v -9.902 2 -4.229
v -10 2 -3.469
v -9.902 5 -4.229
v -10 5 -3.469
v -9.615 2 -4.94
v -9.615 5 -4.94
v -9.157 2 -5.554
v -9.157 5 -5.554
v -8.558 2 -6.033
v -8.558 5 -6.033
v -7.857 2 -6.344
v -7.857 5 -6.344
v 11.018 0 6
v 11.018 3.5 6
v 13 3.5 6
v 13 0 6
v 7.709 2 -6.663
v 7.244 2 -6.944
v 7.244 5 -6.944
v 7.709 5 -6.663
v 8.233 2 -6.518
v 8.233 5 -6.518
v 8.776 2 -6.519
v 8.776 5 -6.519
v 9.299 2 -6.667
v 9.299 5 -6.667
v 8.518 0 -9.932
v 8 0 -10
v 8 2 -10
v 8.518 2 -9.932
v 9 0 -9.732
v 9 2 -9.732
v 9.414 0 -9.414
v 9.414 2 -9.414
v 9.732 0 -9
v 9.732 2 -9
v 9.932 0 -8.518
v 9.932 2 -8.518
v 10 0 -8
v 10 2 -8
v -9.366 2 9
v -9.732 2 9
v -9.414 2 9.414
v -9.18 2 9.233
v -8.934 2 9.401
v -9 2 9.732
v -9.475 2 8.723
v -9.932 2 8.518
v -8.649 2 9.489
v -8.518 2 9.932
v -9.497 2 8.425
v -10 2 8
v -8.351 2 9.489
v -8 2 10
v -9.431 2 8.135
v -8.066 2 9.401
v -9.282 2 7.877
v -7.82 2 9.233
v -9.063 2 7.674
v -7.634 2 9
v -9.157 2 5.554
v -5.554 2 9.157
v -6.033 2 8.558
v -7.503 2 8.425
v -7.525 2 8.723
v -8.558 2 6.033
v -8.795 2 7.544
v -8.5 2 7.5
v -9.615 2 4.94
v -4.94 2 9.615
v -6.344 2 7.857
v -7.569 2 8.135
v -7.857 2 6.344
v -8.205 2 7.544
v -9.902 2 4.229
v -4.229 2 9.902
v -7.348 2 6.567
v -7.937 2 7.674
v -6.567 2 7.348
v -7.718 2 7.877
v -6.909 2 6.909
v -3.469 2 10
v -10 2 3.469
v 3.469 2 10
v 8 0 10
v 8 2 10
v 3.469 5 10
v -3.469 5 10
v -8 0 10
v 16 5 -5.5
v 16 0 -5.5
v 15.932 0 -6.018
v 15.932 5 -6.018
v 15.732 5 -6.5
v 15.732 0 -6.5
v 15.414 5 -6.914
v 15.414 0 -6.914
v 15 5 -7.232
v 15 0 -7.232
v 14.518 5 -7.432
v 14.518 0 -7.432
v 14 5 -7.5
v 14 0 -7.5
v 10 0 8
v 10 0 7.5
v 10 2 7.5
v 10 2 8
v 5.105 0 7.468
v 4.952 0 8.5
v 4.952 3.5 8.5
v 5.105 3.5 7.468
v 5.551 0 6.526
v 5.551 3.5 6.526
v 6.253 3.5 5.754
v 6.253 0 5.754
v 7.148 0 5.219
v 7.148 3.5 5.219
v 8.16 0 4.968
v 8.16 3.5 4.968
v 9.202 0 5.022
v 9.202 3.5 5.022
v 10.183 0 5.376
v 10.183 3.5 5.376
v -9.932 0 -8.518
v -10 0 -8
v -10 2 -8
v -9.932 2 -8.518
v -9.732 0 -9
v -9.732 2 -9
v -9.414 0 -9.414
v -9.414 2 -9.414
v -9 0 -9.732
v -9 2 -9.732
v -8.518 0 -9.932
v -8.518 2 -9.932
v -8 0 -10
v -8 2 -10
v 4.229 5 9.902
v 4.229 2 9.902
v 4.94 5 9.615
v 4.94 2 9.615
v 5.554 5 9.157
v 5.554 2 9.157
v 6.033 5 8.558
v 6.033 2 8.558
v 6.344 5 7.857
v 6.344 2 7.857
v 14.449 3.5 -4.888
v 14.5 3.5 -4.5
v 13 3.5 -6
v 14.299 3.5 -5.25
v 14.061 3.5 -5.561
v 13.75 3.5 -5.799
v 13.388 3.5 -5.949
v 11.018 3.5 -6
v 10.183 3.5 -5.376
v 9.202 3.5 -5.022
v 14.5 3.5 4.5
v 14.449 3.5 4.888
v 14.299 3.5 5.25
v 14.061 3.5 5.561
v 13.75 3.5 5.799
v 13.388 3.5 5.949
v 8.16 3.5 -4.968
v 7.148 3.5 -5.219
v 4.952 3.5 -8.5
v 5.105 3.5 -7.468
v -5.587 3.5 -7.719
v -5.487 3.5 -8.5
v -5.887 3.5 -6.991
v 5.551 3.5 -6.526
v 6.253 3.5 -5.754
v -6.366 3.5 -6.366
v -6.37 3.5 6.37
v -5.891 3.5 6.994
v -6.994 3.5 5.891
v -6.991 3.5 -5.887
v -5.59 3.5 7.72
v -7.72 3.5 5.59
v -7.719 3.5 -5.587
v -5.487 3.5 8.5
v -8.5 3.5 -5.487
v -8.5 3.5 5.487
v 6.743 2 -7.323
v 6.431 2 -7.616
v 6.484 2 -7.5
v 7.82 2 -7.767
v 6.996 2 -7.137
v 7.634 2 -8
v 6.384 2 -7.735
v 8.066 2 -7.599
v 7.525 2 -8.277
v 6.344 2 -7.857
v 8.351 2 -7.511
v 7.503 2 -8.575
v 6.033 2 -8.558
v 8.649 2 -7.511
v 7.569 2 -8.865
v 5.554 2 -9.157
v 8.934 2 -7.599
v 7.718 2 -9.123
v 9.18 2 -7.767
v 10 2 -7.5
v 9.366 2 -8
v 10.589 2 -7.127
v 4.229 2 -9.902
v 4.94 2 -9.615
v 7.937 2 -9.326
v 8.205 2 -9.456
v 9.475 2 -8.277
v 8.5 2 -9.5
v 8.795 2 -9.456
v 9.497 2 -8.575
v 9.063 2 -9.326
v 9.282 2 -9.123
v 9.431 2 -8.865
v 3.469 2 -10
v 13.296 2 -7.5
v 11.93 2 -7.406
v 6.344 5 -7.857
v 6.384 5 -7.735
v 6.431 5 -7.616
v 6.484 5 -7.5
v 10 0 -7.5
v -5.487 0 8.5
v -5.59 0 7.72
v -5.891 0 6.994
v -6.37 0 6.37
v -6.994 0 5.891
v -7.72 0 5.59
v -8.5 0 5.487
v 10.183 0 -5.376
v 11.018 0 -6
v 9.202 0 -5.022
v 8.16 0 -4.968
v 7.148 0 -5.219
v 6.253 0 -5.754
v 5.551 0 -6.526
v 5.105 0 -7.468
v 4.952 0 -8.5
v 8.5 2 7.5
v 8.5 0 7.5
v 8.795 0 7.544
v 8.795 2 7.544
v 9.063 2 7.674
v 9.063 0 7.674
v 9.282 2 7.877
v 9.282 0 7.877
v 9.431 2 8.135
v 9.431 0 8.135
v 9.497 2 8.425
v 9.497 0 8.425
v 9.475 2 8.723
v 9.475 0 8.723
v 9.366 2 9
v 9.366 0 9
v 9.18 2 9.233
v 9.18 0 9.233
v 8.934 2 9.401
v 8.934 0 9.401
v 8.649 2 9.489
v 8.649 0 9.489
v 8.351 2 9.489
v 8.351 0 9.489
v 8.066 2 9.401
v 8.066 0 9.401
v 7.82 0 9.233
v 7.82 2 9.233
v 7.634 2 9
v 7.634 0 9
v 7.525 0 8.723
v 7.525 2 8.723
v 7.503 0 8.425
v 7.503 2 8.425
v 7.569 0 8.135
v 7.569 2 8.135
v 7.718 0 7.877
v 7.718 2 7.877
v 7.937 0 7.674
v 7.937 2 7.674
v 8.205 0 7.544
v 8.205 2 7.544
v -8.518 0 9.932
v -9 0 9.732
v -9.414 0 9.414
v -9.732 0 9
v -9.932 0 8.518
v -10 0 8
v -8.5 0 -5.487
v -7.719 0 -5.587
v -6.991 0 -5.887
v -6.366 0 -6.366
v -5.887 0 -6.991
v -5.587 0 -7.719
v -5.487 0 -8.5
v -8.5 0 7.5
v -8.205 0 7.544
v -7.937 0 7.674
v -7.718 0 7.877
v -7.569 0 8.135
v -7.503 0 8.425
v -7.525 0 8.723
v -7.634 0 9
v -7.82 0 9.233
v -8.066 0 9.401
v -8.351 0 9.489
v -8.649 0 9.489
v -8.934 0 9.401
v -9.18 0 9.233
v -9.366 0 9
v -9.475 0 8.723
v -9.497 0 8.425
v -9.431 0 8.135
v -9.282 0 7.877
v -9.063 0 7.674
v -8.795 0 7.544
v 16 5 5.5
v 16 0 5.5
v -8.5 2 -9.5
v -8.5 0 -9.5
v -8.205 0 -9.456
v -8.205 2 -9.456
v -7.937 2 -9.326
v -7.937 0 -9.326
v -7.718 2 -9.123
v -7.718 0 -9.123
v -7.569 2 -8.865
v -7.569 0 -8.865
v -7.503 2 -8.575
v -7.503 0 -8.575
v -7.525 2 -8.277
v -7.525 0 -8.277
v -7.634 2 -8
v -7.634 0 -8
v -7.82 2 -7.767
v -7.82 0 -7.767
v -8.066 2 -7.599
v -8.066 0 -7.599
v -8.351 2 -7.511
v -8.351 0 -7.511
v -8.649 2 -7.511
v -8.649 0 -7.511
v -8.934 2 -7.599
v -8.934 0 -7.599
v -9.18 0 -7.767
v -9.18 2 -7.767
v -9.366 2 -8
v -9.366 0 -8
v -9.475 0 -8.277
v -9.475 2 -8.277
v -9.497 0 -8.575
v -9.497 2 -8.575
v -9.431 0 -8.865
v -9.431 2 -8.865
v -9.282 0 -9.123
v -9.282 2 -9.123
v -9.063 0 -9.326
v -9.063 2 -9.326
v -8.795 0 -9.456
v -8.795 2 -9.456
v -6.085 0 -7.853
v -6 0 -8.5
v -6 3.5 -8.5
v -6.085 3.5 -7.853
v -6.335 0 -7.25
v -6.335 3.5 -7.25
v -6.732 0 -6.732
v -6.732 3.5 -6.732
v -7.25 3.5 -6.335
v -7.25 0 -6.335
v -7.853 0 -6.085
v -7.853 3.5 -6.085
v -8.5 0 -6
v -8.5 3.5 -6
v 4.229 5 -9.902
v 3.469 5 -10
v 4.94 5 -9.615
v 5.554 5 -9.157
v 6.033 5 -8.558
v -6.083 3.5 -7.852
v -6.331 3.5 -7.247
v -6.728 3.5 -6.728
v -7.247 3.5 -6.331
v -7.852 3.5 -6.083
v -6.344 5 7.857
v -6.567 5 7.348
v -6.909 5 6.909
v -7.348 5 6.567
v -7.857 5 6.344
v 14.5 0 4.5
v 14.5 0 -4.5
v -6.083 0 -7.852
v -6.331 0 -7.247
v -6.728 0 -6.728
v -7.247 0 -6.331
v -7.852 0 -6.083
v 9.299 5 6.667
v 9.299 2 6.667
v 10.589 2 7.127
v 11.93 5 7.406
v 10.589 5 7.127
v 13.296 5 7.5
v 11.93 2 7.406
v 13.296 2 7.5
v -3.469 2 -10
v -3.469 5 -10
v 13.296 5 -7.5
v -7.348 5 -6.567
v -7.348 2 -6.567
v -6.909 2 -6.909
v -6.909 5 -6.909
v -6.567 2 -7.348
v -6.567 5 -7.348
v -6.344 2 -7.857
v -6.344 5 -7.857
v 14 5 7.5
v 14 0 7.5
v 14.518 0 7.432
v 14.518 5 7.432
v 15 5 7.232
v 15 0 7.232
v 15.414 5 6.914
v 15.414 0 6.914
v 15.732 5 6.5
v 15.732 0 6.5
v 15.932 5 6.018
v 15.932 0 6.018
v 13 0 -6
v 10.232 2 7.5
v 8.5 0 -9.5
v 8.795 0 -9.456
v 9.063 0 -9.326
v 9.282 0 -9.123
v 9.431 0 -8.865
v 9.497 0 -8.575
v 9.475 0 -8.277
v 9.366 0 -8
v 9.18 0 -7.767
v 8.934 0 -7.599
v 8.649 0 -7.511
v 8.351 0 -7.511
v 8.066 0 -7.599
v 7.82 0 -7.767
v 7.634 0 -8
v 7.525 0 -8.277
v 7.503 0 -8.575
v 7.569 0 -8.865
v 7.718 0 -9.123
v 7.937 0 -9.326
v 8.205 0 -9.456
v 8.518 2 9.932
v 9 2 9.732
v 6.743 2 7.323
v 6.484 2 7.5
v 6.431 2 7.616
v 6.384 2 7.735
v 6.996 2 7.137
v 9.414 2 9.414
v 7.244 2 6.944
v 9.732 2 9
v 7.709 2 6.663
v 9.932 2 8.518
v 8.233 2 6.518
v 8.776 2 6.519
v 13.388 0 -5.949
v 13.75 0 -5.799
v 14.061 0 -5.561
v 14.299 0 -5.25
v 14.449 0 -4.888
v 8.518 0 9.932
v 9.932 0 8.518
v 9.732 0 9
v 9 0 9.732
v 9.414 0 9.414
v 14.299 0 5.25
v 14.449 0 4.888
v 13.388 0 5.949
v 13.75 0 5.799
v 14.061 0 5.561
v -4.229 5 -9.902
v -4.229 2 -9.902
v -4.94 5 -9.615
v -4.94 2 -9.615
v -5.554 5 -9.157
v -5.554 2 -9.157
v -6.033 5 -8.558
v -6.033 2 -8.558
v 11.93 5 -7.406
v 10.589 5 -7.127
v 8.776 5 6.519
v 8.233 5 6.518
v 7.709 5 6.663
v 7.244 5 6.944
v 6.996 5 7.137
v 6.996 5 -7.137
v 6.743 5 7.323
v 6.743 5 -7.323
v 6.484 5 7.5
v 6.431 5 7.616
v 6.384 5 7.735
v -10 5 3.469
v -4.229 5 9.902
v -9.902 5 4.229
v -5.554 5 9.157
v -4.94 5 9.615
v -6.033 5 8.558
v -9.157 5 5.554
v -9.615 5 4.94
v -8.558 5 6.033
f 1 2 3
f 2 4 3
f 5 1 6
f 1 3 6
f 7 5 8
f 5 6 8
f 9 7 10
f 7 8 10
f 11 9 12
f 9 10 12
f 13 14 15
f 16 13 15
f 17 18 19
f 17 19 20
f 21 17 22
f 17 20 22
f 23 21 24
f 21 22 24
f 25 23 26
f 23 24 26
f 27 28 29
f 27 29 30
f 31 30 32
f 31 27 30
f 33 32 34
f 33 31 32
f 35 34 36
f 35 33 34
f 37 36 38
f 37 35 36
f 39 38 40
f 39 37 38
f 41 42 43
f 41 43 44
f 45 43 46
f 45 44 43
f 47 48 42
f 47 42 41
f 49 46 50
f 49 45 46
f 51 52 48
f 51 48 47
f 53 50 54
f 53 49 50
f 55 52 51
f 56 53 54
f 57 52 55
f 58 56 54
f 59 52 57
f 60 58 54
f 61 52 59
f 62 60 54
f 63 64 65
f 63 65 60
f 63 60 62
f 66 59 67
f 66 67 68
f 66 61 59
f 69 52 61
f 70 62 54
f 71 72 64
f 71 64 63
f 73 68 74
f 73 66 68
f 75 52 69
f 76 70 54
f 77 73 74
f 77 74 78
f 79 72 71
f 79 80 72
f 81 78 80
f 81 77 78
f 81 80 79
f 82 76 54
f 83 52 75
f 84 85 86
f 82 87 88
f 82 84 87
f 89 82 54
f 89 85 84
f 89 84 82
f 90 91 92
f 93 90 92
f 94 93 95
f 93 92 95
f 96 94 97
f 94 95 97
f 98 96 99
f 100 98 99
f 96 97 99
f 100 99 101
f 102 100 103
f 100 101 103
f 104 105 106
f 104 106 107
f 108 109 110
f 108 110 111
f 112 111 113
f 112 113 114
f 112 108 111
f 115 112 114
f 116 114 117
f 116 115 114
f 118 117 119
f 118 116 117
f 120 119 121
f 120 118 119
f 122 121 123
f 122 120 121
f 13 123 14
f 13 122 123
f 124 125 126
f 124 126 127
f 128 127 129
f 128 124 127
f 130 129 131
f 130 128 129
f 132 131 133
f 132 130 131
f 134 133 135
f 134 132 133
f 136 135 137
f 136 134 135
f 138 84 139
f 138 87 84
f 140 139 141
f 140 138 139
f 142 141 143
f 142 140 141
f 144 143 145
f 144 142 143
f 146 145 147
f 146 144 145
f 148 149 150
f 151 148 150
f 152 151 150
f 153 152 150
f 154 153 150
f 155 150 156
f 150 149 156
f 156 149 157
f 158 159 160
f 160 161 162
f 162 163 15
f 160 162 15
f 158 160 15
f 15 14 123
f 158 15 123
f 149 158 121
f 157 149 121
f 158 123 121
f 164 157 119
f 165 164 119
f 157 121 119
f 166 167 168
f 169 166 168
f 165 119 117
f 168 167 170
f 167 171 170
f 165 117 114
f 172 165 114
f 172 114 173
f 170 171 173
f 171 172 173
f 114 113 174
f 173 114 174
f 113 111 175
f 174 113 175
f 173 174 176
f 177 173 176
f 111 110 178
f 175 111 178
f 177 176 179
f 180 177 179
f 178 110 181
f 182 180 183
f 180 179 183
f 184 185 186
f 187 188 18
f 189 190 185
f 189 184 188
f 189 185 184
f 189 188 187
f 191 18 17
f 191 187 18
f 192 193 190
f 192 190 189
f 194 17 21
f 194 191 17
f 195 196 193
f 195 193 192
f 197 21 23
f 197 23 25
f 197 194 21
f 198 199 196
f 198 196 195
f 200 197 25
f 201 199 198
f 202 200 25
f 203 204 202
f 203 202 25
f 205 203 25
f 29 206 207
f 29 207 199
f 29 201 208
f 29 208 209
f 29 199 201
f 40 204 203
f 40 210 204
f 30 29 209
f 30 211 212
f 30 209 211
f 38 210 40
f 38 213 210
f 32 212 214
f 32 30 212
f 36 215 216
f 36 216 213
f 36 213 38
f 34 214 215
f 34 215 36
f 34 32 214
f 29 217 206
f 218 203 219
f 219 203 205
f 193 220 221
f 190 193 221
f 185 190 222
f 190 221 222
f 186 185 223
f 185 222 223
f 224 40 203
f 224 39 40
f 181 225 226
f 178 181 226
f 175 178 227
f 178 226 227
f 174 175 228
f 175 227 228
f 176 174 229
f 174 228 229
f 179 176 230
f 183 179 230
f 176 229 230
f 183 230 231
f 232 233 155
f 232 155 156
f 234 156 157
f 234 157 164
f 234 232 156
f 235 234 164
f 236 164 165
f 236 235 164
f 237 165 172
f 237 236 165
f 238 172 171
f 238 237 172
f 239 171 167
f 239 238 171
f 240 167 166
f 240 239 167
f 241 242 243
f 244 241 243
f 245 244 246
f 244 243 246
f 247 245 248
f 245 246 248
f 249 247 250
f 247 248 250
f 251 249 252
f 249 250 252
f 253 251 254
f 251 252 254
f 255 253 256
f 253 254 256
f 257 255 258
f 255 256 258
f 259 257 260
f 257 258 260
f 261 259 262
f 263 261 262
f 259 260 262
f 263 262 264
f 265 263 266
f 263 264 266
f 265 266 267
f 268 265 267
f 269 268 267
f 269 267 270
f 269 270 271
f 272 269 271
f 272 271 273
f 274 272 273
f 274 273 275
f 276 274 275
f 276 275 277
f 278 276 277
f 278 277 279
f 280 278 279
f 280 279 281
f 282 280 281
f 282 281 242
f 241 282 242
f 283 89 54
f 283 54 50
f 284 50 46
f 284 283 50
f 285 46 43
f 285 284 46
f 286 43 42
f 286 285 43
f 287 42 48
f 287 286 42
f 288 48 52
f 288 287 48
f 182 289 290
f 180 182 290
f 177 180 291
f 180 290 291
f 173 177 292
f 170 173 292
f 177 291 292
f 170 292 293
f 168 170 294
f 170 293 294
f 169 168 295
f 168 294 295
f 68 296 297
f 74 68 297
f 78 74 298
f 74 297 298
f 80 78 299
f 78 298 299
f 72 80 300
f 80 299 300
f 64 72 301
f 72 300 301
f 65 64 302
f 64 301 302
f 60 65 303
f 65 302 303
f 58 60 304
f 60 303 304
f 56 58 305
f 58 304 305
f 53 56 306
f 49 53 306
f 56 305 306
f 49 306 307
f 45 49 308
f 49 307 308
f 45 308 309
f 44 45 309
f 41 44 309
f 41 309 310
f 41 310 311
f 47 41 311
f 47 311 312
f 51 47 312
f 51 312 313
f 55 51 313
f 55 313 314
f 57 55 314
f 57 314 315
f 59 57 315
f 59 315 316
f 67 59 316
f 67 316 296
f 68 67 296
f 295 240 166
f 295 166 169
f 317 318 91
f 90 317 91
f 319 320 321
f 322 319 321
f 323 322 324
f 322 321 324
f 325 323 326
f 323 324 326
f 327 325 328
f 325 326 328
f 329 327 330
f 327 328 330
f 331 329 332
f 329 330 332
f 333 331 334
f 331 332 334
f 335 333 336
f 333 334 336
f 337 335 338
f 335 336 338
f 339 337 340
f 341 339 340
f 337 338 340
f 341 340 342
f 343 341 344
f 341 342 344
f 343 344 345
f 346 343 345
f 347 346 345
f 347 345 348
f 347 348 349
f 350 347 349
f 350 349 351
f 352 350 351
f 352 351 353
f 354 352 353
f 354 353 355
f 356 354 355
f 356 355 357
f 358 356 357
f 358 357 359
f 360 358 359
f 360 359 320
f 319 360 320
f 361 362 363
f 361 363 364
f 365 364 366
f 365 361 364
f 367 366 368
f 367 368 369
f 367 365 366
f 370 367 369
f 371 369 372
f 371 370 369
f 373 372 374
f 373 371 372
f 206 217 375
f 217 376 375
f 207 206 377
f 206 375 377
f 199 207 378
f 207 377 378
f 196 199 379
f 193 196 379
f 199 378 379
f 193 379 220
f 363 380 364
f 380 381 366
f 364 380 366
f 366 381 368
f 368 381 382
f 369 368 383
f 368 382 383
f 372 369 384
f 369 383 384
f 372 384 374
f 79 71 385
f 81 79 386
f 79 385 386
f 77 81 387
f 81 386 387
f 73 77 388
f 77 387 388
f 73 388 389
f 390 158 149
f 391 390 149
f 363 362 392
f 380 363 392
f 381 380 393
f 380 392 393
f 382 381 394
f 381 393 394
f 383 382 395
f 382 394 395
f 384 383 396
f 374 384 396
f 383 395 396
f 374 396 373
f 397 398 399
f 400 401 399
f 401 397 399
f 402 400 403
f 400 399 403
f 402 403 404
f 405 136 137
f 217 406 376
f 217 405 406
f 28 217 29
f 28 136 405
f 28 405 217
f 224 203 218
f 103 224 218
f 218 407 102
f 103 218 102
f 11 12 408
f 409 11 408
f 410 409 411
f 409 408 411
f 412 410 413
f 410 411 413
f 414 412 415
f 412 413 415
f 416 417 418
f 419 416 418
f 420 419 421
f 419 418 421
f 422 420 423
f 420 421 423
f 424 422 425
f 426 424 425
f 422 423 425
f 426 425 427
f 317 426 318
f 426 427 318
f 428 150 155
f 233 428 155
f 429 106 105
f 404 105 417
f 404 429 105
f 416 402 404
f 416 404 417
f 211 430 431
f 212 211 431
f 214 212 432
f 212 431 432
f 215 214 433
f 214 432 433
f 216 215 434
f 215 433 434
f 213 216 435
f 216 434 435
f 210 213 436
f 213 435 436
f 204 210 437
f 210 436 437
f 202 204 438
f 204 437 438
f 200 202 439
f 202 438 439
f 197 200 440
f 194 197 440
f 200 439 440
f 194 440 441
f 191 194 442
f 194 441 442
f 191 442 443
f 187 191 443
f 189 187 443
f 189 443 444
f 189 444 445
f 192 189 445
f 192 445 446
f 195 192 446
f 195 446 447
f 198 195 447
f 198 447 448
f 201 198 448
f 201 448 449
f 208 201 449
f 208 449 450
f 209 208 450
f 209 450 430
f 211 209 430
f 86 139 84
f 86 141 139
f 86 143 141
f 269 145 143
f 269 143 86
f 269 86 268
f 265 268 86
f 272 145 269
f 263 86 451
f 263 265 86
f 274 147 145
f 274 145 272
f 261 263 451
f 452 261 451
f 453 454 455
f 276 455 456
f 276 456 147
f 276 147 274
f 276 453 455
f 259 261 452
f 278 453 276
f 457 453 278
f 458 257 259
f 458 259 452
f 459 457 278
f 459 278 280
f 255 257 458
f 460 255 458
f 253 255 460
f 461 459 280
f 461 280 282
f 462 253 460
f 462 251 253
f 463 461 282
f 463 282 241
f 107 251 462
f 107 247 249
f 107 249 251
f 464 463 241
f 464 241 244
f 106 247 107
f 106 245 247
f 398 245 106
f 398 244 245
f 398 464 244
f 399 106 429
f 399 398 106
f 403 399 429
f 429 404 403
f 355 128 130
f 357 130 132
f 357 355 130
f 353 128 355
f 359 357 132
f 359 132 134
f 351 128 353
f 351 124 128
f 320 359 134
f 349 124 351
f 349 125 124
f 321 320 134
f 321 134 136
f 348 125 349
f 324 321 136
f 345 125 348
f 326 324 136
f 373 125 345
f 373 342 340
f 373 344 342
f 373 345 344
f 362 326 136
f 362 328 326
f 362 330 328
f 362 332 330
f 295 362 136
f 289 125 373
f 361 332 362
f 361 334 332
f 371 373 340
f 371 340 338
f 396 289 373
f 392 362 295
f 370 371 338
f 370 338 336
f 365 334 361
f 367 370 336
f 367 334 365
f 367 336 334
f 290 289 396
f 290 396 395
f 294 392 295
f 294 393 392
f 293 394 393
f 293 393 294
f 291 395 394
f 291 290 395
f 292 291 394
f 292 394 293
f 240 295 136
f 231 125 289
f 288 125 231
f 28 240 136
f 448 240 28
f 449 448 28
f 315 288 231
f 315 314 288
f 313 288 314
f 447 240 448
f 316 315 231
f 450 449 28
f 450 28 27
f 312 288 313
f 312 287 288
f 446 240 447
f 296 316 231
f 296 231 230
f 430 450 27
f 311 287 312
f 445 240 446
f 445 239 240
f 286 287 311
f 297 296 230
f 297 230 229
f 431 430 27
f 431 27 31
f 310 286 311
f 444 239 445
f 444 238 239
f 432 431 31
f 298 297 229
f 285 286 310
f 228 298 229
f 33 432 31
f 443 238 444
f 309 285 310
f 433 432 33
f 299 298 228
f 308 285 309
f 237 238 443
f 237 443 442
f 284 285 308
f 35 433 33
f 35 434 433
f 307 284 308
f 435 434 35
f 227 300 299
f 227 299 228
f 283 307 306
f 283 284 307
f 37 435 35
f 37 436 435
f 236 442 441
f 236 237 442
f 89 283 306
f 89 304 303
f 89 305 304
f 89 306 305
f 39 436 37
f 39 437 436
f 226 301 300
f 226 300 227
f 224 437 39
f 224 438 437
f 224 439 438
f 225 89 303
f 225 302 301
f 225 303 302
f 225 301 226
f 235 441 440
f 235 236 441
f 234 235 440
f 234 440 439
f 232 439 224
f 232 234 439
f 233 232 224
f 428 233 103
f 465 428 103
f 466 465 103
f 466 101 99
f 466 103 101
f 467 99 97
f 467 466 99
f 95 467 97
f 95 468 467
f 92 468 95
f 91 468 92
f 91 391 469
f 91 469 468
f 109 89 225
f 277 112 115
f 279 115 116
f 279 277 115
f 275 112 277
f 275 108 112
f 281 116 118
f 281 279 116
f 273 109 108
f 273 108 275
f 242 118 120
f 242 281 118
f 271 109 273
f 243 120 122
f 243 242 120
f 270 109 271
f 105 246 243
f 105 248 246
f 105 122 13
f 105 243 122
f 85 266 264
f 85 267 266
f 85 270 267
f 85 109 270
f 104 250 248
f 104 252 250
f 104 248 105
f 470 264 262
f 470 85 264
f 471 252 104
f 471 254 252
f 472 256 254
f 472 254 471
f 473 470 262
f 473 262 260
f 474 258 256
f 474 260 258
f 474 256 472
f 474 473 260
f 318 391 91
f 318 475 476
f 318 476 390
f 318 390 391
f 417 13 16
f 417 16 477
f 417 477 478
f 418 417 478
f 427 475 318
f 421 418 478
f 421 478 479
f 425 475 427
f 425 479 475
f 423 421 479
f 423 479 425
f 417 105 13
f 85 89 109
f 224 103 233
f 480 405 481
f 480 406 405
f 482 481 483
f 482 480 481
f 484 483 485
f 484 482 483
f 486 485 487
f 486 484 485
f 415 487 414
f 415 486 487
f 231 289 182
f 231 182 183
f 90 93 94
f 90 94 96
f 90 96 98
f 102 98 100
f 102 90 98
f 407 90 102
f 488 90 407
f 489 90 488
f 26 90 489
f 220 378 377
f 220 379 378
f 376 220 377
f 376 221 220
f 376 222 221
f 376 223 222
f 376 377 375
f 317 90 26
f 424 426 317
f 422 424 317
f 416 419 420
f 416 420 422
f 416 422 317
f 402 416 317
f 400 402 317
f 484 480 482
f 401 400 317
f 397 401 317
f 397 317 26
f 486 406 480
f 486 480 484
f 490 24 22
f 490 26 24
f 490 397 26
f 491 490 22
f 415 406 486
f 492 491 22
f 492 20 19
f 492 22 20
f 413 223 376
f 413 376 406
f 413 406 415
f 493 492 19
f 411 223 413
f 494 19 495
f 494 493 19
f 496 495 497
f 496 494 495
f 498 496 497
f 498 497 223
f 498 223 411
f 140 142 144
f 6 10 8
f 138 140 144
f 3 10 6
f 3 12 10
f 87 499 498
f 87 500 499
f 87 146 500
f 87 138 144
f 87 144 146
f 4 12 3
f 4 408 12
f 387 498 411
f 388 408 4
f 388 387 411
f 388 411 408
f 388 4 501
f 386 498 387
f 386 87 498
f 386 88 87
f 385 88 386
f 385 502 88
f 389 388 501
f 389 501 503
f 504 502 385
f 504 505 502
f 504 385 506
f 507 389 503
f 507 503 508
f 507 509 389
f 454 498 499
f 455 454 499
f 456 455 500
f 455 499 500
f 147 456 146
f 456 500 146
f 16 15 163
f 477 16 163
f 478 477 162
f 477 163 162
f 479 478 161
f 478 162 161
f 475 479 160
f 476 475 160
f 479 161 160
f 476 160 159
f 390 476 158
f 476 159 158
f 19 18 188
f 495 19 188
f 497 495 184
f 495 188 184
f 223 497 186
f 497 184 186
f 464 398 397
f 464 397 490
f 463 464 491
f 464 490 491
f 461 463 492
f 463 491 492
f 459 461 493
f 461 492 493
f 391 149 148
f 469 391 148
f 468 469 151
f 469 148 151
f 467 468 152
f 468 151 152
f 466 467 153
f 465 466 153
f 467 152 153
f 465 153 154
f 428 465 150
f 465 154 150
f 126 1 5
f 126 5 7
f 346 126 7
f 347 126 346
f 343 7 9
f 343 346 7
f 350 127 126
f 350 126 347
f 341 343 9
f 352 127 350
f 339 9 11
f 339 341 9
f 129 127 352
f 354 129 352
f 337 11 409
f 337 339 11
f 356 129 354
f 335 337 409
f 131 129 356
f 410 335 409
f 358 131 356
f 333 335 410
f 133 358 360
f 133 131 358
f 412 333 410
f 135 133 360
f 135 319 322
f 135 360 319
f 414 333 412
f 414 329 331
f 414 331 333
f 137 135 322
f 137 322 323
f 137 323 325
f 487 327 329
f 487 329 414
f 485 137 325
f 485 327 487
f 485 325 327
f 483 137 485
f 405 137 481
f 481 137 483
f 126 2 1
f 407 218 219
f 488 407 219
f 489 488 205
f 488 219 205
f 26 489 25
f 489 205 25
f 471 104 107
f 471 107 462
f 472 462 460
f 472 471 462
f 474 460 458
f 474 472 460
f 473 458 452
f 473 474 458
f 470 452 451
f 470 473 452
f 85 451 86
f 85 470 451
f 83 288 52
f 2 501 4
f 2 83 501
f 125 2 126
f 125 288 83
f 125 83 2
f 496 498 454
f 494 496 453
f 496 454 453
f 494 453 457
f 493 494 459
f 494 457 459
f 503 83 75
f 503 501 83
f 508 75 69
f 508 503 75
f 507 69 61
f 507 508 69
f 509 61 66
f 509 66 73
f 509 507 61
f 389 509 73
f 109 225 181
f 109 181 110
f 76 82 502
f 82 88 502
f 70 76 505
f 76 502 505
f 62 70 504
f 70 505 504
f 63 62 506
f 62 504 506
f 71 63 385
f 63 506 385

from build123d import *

# Parameters (mm, degrees)
BOSS_EXTRUDE1_DEPTH     = 5
SKETCH2_R               = 1
CUT_EXTRUDE1_DEPTH      = 15
SHELL1_DEPTH            = 3.5
SKETCH4_R               = 2.25
CUT_EXTRUDE2_DEPTH      = 3
FILLET2_R               = 3
BOSS_EXTRUDE2_DEPTH     = 5
CUT_EXTRUDE3_DEPTH      = 3.5
SKETCH8_W               = 3.515564437
SKETCH8_H               = 15
BOSS_EXTRUDE3_DEPTH     = 3
SKETCH9_R               = 2
CUT_EXTRUDE5_DEPTH      = 3
FILLET3_R               = 10
CUT_EXTRUDE7_DEPTH      = 3
CUT_EXTRUDE7_DEPTH_BACK = 1.5
BOSS_EXTRUDE4_START     = 3.5
BOSS_EXTRUDE4_DEPTH     = 3.5


with BuildPart() as part:
    # Sketch1 → Boss-Extrude1 (new body)
    with BuildSketch(Plane(origin=(0, 0, 0), x_dir=(1, 0, 0), z_dir=(0, 1, 0))):
        with BuildLine():
            Line((-8, 10), (8, 10))
            ThreePointArc((8, 10), (9.414213562, 9.414213562), (10, 8))
            Line((10, 8), (10, -8))
            ThreePointArc((10, -8), (9.414213562, -9.414213562), (8, -10))
            Line((8, -10), (-8, -10))
            ThreePointArc((-8, -10), (-9.414213562, -9.414213562), (-10, -8))
            Line((-10, -8), (-10, 8))
            ThreePointArc((-10, 8), (-9.414213562, 9.414213562), (-8, 10))
        make_face()
    extrude(amount=BOSS_EXTRUDE1_DEPTH)

    # Sketch2 → Cut-Extrude1 (cut)
    with BuildSketch(Plane.XZ):
        with Locations(Location((-8.5, 8.5, 0), (0, 0, 270))):
            Circle(SKETCH2_R)
        with Locations(Location((8.5, 8.5, 0), (0, 0, 270))):
            Circle(SKETCH2_R)
        with Locations(Location((8.5, -8.5, 0), (0, 0, 270))):
            Circle(SKETCH2_R)
        with Locations(Location((-8.5, -8.5, 0), (0, 0, 270))):
            Circle(SKETCH2_R)
    extrude(amount=-CUT_EXTRUDE1_DEPTH, mode=Mode.SUBTRACT)

    # Shell1: read off the stored shape, not the designer's step
    # Shell1 outline → Shell1 (cut)
    with BuildSketch(Plane(origin=(0, 0, 0), x_dir=(1, 0, 0), z_dir=(0, 1, 0))):
        with BuildLine():
            Line((6, 8.5), (-6, 8.5))
            ThreePointArc((-6, 8.5), (-6.732233047, 6.732233047), (-8.5, 6))
            Line((-8.5, 6), (-8.5, -6))
            ThreePointArc((-8.5, -6), (-6.732233047, -6.732233047), (-6, -8.5))
            Line((-6, -8.5), (6, -8.5))
            ThreePointArc((6, -8.5), (6.732233047, -6.732233047), (8.5, -6))
            Line((8.5, -6), (8.5, 6))
            ThreePointArc((8.5, 6), (6.732233047, 6.732233047), (6, 8.5))
        make_face()
    extrude(amount=SHELL1_DEPTH, mode=Mode.SUBTRACT)

    # Sketch4 → Cut-Extrude2 (cut)
    with BuildSketch(Plane(origin=(0, 5, 0), x_dir=(1, 0, 0), z_dir=(0, 1, 0))):
        with Locations((8.5, -8.5)):
            Circle(SKETCH4_R)
        with Locations((-8.5, -8.5)):
            Circle(SKETCH4_R)
        with Locations((-8.5, 8.5)):
            Circle(SKETCH4_R)
        with Locations((8.5, 8.5)):
            Circle(SKETCH4_R)
    extrude(amount=-CUT_EXTRUDE2_DEPTH, mode=Mode.SUBTRACT)

    # Fillet2
    fillet2_edges = [part.edges().sort_by_distance(p)[0] for p in [
        (6.822949017, 3.5, -10),
        (10, 3.5, -6.822949017),
        (-6.822949017, 3.5, -10),
        (-10, 3.5, -6.822949017),
        (-10, 3.5, 6.822949017),
        (-6.822949017, 3.5, 10),
        (6.822949017, 3.5, 10),
        (10, 3.5, 6.822949017),
    ]]
    fillet(fillet2_edges, radius=FILLET2_R)

    # Sketch5 → Boss-Extrude2 (add)
    with BuildSketch(Plane.XZ):
        with BuildLine():
            Line((10, 7.5), (14, 7.5))
            ThreePointArc((14, 7.5), (15.414213562, 6.914213562), (16, 5.5))
            Line((16, 5.5), (16, -5.5))
            ThreePointArc((16, -5.5), (15.414213562, -6.914213562), (14, -7.5))
            Line((14, -7.5), (10, -7.5))
            Line((10, -7.5), (10, 7.5))
        make_face()
    extrude(amount=-BOSS_EXTRUDE2_DEPTH)

    # Sketch6 → Cut-Extrude3 (cut)
    with BuildSketch(Plane.XZ):
        with BuildLine():
            Line((8.5, 5.5), (13, 5.5))
            ThreePointArc((13, 5.5), (14.060660172, 5.060660172), (14.5, 4))
            Line((14.5, 4), (14.5, -4))
            ThreePointArc((14.5, -4), (14.060660172, -5.060660172), (13, -5.5))
            Line((13, -5.5), (8.5, -5.5))
            Line((8.5, -5.5), (8.5, 5.5))
        make_face()
    extrude(amount=-CUT_EXTRUDE3_DEPTH, mode=Mode.SUBTRACT)

    # Sketch8 → Boss-Extrude3 (add)
    with BuildSketch(Plane(origin=(0, 5, 0), x_dir=(1, 0, 0), z_dir=(0, 1, 0))):
        with Locations((8.242217782, 0)):
            Rectangle(SKETCH8_W, SKETCH8_H)
    extrude(amount=-BOSS_EXTRUDE3_DEPTH)

    # Sketch9 → Cut-Extrude5 (cut)
    with BuildSketch(Plane(origin=(0, 5, 0), x_dir=(1, 0, 0), z_dir=(0, 1, 0))):
        with Locations((8.5, 8.5)):
            Circle(SKETCH9_R)
        with Locations((8.5, -8.5)):
            Circle(SKETCH9_R)
    extrude(amount=-CUT_EXTRUDE5_DEPTH, mode=Mode.SUBTRACT)

    # Fillet3
    # the kernel refuses this fillet: 10 mm, written as the material it takes off along each edge
    with BuildSketch(Plane(origin=(10.232050808, 2, -7.5), x_dir=(1, 0, 0), z_dir=(0, 1, 0))) as fillet3_piece_1:
        with BuildLine():
            CenterArc((3.063780716, -10), FILLET3_R, 90, 23.556464309)
            ThreePointArc((-0.932745554, -0.833333333), (-0.399552407, -0.491458351), (0, 0))
            Line((0, 0), (3.063780716, 0))
        make_face()
    extrude(amount=10.659451789, mode=Mode.SUBTRACT)
    with BuildSketch(Plane(origin=(6.767949192, 2, -7.5), x_dir=(0.649978972407837, 0, 0.759952192856664), z_dir=(0, 1, 0))) as fillet3_piece_2:
        with BuildLine():
            CenterArc((2.560910878, -9.831273909), FILLET3_R, 100.540016502, 5.393327967)
            Line((-0.184277898, -0.215456804), (0, 0))
            ThreePointArc((0, 0), (0.365844411, -0.033745218), (0.731688822, 0))
        make_face()
    extrude(amount=4.829222056, mode=Mode.SUBTRACT)
    with BuildSketch(Plane(origin=(10.232050808, 2, 7.5), x_dir=(-0.7457291752746819, 0, -0.6662492004829293), z_dir=(0, 1, 0))) as fillet3_piece_3:
        with BuildLine():
            CenterArc((4.377741338, -9.498533205), FILLET3_R, 108.221767845, 23.556464309)
            Line((-2.284750666, -2.041241452), (0, 0))
            ThreePointArc((0, 0), (0.62539162, -0.100293359), (1.25078324, 0))
        make_face()
    extrude(amount=10.659451789, mode=Mode.SUBTRACT)
    with BuildSketch(Plane(origin=(6.767949192, 2, 7.5), x_dir=(-1.0, 0, -2.3874717233974133e-11), z_dir=(0, 1, 0))) as fillet3_piece_4:
        with BuildLine():
            CenterArc((5.806759945, -8.33629115), FILLET3_R, 123.52663903, 5.393327967)
            ThreePointArc((-0.475582349, -0.556048525), (-0.212146422, -0.299957945), (0, 0))
            Line((0, 0), (0.28351363, 0))
        make_face()
    extrude(amount=4.829222056, mode=Mode.SUBTRACT)

    # Sketch10 → Cut-Extrude7 (cut, two sides: drawn at the far end of the back side and taken through both)
    with BuildSketch(Plane.XZ.offset(-2).offset(-CUT_EXTRUDE7_DEPTH_BACK)):
        with BuildLine():
            Line((8.5, 6), (13, 6))
            ThreePointArc((13, 6), (14.060660172, 5.560660172), (14.5, 4.5))
            Line((14.5, 4.5), (14.5, -4.5))
            ThreePointArc((14.5, -4.5), (14.060660172, -5.560660172), (13, -6))
            Line((13, -6), (8.5, -6))
            ThreePointArc((8.5, -6), (7.370298682, -6.269803835), (6.484435563, -7.020980054))
            Line((6.484435563, -7.020980054), (6.484435563, 7.020980054))
            ThreePointArc((6.484435563, 7.020980054), (7.392428114, 6.313490581), (8.5, 6))
        make_face()
    extrude(amount=CUT_EXTRUDE7_DEPTH + CUT_EXTRUDE7_DEPTH_BACK, mode=Mode.SUBTRACT)

    # Sketch11 → Boss-Extrude4 (add)
    with BuildSketch(Plane.XZ.offset(-3.5).offset(BOSS_EXTRUDE4_START)):
        with BuildLine():
            Line((4.951661673, -8.5), (6, -8.5))
            ThreePointArc((6, -8.5), (6.732233047, -6.732233047), (8.5, -6))
            Line((8.5, -6), (11.018075631, -6))
            ThreePointArc((11.018075631, -6), (7.148016159, -5.219322543), (4.951661673, -8.5))
        make_face()
        with BuildLine():
            Line((11.018075631, 6), (8.5, 6))
            ThreePointArc((8.5, 6), (6.798059889, 6.798059889), (6, 8.5))
            Line((6, 8.5), (4.951661673, 8.5))
            ThreePointArc((4.951661673, 8.5), (7.148016159, 5.219322543), (11.018075631, 6))
        make_face()
        with BuildLine():
            Line((-6, 8.5), (-5.487129131, 8.5))
            ThreePointArc((-5.487129131, 8.5), (-6.369578578, 6.369578578), (-8.5, 5.487129131))
            Line((-8.5, 5.487129131), (-8.5, 6))
            ThreePointArc((-8.5, 6), (-6.732233047, 6.732233047), (-6, 8.5))
        make_face()
        with BuildLine():
            Line((-8.5, -6), (-8.5, -5.487129131))
            ThreePointArc((-8.5, -5.487129131), (-6.365781058, -6.365781058), (-5.487129131, -8.5))
            Line((-5.487129131, -8.5), (-5.689784623, -8.747525568))
            Line((-5.689784623, -8.747525568), (-6, -8.5))
            ThreePointArc((-6, -8.5), (-6.728431484, -6.728431484), (-8.5, -6))
        make_face()
    extrude(amount=-BOSS_EXTRUDE4_DEPTH)


solid = part.part
